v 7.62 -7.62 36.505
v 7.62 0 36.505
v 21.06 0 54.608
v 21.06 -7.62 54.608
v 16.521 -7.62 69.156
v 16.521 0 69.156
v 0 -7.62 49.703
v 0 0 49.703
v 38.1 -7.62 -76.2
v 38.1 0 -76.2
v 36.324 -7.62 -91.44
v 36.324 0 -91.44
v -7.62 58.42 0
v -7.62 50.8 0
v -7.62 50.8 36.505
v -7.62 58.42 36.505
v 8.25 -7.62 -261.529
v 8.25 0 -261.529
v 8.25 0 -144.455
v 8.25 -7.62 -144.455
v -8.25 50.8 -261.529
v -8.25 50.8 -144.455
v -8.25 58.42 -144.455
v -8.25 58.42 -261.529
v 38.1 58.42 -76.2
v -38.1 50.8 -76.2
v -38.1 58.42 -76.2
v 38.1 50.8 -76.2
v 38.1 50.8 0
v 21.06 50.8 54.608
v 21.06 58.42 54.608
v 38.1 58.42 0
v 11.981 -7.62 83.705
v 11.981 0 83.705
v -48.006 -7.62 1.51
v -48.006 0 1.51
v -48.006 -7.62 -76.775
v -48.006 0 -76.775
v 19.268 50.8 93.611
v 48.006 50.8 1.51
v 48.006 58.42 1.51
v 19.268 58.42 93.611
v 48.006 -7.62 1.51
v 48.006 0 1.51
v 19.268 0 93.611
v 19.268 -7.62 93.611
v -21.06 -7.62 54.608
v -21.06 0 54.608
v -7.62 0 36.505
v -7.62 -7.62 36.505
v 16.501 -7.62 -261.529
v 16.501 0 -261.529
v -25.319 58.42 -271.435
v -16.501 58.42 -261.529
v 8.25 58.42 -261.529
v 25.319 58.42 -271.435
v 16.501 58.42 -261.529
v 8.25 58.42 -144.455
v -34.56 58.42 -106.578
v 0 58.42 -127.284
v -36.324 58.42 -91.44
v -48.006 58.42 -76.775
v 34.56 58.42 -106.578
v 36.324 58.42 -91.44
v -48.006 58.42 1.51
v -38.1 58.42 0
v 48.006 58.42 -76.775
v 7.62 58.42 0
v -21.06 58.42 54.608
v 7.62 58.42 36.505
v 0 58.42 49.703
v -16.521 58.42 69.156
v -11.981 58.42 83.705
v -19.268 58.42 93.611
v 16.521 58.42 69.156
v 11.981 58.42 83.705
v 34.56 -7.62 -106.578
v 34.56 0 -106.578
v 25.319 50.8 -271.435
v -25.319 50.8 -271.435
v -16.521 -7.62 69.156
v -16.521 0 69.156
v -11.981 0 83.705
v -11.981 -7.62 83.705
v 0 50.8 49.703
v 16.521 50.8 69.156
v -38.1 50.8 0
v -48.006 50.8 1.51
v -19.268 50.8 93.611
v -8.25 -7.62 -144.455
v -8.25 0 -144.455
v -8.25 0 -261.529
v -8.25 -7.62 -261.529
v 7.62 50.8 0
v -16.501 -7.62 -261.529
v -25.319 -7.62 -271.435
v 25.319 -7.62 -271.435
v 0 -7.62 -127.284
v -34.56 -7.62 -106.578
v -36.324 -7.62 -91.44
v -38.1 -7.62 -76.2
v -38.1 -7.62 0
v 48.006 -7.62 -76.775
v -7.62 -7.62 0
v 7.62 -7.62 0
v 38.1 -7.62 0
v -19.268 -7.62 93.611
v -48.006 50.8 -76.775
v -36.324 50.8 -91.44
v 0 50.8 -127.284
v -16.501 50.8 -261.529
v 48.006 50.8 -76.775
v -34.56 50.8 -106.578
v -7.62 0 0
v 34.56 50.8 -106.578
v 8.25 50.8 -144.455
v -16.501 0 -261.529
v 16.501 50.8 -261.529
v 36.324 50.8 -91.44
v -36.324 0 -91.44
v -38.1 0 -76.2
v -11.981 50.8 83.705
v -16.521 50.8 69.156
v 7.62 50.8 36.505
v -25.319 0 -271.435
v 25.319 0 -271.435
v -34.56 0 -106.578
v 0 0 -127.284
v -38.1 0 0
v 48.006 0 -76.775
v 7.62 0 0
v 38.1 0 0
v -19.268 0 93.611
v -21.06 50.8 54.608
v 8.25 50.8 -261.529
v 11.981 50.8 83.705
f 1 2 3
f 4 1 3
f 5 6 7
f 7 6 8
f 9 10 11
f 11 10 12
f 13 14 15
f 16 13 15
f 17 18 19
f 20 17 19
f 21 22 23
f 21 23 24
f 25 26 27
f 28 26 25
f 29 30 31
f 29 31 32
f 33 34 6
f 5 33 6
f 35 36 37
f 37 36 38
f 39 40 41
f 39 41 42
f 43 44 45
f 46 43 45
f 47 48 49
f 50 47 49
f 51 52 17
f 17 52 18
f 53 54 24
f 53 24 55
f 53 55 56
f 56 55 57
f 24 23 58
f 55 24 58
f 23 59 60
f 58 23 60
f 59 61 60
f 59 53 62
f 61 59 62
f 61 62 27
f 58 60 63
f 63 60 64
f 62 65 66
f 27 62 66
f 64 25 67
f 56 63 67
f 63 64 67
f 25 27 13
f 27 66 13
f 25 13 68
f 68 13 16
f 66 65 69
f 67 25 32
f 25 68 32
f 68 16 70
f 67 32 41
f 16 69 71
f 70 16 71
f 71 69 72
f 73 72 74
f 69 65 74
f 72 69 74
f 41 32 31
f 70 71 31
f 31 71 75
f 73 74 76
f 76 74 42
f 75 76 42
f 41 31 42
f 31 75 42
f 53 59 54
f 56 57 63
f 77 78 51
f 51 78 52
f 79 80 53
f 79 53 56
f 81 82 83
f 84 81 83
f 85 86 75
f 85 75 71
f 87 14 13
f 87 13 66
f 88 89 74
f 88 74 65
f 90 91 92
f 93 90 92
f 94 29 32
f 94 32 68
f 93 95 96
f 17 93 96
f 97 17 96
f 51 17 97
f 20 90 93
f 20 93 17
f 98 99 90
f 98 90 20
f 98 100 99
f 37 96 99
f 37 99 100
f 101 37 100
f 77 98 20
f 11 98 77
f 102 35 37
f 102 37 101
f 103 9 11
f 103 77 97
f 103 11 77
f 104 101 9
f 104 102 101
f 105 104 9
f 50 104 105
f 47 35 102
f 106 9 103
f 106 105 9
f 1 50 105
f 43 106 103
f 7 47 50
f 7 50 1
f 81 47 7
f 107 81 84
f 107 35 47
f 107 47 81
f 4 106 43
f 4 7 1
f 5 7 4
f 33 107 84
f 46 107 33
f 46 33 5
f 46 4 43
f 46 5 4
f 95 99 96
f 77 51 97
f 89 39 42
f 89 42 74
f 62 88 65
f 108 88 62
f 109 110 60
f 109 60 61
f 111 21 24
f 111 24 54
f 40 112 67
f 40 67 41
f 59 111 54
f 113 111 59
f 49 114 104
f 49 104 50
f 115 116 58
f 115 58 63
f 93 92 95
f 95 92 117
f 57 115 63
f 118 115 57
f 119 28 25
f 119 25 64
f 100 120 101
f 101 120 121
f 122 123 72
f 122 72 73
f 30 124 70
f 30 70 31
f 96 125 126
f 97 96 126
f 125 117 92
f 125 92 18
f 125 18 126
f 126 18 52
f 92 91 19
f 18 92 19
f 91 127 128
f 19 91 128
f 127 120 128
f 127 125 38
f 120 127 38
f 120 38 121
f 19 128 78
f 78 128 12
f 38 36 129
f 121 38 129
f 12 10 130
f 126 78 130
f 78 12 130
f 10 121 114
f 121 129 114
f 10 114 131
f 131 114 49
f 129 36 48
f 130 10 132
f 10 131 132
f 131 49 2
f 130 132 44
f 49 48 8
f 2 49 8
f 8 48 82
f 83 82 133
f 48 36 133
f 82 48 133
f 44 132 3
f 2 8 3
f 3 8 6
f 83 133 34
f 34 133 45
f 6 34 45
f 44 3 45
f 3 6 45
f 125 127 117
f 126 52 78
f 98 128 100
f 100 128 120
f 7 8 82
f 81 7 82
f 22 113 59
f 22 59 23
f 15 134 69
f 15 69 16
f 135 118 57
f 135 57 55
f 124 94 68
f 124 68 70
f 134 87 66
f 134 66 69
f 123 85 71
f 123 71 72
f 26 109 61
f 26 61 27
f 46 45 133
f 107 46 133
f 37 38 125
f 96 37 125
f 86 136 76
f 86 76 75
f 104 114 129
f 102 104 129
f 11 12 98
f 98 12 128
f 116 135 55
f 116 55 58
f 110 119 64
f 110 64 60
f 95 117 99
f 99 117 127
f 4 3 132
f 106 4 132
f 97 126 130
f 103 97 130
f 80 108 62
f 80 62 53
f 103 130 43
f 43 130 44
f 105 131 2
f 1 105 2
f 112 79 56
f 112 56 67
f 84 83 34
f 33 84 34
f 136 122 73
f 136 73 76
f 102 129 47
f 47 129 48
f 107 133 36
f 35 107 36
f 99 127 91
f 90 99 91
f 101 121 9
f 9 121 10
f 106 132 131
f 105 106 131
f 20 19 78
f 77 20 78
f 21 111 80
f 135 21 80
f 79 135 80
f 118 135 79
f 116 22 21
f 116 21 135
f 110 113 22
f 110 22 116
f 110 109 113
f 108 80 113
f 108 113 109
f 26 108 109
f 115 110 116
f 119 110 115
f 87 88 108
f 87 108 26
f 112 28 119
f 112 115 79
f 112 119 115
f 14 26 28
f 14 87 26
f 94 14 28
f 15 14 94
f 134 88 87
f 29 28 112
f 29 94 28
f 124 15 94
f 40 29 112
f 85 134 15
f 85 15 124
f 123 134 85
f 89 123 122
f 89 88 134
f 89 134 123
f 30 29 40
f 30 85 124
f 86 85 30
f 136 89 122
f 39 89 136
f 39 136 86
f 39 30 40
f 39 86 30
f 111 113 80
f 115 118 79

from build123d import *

# Parameters (mm, degrees)
F0_W     = 15.24
F0_H     = 36.5052193037
F2_DEPTH = 7.62


with BuildPart() as f2:
    # F0 (on Front) → F2 (new body)
    with BuildSketch(Plane.XZ):
        Polygon((-19.2675294544, 93.6105943945), (-48.006000328, 1.5096033995), (-48.006000328, -76.7753090553), (-25.319093059, -271.4345891594), (0, -271.4345891594), (25.319093059, -271.4345891594), (48.006000328, -76.7753090553), (48.006000328, 1.5096033995), (19.2675294544, 93.6105943945), (0, 93.6105943945), align=None)
        Polygon((-38.1, -76.2), (-38.1, 0), (-21.0604944566, 54.6081715172), (-16.5209847134, 69.1563827919), (-11.9814749703, 83.7045940665), (0, 83.7045940665), (11.9814749703, 83.7045940665), (16.5209847134, 69.1563827919), (21.0604944566, 54.6081715172), (38.1, 0), (38.1, -76.2), (36.3238274662, -91.44), (34.5595964222, -106.577539061), (16.5005545132, -261.5285888314), (8.2502772566, -261.5285888314), (0, -261.5285888314), (-8.2502772566, -261.5285888314), (-16.5005545132, -261.5285888314), (-34.5595964222, -106.577539061), (-36.3238274662, -91.44), align=None, mode=Mode.SUBTRACT)
        Polygon((-7.62, 0), (-38.1, 0), (-38.1, -76.2), (38.1, -76.2), (38.1, 0), (7.62, 0), align=None)
        Polygon((8.2502772566, -144.4549709558), (-8.2502772566, -144.4549709558), (-8.2502772566, -261.5285888314), (0, -261.5285888314), (8.2502772566, -261.5285888314), align=None)
        Polygon((0, -127.2841985449), (-36.3238274662, -91.44), (-34.5595964222, -106.577539061), (-8.2502772566, -144.4549709558), align=None)
        Polygon((34.5595964222, -106.577539061), (36.3238274662, -91.44), (0, -127.2841985449), (8.2502772566, -144.4549709558), align=None)
        with Locations((0, 18.2526096518)):
            Rectangle(F0_W, F0_H)
        Polygon((0, 49.7034464574), (7.62, 36.5052193037), (21.0604944566, 54.6081715172), (16.5209847134, 69.1563827919), align=None)
        Polygon((-16.5209847134, 69.1563827919), (-21.0604944566, 54.6081715172), (-7.62, 36.5052193037), (0, 49.7034464574), align=None)
        Polygon((8.2502772566, -144.4549709558), (0, -127.2841985449), (-8.2502772566, -144.4549709558), align=None)
        Polygon((0, 49.7034464574), (-7.62, 36.5052193037), (7.62, 36.5052193037), align=None)
    extrude(amount=F2_DEPTH)


with BuildPart() as f3_1:
    # F3: instance of F2
    add(f2.part.mirror(Plane.XZ.offset(-25.4)))


solid = Compound([f2.part, f3_1.part])
